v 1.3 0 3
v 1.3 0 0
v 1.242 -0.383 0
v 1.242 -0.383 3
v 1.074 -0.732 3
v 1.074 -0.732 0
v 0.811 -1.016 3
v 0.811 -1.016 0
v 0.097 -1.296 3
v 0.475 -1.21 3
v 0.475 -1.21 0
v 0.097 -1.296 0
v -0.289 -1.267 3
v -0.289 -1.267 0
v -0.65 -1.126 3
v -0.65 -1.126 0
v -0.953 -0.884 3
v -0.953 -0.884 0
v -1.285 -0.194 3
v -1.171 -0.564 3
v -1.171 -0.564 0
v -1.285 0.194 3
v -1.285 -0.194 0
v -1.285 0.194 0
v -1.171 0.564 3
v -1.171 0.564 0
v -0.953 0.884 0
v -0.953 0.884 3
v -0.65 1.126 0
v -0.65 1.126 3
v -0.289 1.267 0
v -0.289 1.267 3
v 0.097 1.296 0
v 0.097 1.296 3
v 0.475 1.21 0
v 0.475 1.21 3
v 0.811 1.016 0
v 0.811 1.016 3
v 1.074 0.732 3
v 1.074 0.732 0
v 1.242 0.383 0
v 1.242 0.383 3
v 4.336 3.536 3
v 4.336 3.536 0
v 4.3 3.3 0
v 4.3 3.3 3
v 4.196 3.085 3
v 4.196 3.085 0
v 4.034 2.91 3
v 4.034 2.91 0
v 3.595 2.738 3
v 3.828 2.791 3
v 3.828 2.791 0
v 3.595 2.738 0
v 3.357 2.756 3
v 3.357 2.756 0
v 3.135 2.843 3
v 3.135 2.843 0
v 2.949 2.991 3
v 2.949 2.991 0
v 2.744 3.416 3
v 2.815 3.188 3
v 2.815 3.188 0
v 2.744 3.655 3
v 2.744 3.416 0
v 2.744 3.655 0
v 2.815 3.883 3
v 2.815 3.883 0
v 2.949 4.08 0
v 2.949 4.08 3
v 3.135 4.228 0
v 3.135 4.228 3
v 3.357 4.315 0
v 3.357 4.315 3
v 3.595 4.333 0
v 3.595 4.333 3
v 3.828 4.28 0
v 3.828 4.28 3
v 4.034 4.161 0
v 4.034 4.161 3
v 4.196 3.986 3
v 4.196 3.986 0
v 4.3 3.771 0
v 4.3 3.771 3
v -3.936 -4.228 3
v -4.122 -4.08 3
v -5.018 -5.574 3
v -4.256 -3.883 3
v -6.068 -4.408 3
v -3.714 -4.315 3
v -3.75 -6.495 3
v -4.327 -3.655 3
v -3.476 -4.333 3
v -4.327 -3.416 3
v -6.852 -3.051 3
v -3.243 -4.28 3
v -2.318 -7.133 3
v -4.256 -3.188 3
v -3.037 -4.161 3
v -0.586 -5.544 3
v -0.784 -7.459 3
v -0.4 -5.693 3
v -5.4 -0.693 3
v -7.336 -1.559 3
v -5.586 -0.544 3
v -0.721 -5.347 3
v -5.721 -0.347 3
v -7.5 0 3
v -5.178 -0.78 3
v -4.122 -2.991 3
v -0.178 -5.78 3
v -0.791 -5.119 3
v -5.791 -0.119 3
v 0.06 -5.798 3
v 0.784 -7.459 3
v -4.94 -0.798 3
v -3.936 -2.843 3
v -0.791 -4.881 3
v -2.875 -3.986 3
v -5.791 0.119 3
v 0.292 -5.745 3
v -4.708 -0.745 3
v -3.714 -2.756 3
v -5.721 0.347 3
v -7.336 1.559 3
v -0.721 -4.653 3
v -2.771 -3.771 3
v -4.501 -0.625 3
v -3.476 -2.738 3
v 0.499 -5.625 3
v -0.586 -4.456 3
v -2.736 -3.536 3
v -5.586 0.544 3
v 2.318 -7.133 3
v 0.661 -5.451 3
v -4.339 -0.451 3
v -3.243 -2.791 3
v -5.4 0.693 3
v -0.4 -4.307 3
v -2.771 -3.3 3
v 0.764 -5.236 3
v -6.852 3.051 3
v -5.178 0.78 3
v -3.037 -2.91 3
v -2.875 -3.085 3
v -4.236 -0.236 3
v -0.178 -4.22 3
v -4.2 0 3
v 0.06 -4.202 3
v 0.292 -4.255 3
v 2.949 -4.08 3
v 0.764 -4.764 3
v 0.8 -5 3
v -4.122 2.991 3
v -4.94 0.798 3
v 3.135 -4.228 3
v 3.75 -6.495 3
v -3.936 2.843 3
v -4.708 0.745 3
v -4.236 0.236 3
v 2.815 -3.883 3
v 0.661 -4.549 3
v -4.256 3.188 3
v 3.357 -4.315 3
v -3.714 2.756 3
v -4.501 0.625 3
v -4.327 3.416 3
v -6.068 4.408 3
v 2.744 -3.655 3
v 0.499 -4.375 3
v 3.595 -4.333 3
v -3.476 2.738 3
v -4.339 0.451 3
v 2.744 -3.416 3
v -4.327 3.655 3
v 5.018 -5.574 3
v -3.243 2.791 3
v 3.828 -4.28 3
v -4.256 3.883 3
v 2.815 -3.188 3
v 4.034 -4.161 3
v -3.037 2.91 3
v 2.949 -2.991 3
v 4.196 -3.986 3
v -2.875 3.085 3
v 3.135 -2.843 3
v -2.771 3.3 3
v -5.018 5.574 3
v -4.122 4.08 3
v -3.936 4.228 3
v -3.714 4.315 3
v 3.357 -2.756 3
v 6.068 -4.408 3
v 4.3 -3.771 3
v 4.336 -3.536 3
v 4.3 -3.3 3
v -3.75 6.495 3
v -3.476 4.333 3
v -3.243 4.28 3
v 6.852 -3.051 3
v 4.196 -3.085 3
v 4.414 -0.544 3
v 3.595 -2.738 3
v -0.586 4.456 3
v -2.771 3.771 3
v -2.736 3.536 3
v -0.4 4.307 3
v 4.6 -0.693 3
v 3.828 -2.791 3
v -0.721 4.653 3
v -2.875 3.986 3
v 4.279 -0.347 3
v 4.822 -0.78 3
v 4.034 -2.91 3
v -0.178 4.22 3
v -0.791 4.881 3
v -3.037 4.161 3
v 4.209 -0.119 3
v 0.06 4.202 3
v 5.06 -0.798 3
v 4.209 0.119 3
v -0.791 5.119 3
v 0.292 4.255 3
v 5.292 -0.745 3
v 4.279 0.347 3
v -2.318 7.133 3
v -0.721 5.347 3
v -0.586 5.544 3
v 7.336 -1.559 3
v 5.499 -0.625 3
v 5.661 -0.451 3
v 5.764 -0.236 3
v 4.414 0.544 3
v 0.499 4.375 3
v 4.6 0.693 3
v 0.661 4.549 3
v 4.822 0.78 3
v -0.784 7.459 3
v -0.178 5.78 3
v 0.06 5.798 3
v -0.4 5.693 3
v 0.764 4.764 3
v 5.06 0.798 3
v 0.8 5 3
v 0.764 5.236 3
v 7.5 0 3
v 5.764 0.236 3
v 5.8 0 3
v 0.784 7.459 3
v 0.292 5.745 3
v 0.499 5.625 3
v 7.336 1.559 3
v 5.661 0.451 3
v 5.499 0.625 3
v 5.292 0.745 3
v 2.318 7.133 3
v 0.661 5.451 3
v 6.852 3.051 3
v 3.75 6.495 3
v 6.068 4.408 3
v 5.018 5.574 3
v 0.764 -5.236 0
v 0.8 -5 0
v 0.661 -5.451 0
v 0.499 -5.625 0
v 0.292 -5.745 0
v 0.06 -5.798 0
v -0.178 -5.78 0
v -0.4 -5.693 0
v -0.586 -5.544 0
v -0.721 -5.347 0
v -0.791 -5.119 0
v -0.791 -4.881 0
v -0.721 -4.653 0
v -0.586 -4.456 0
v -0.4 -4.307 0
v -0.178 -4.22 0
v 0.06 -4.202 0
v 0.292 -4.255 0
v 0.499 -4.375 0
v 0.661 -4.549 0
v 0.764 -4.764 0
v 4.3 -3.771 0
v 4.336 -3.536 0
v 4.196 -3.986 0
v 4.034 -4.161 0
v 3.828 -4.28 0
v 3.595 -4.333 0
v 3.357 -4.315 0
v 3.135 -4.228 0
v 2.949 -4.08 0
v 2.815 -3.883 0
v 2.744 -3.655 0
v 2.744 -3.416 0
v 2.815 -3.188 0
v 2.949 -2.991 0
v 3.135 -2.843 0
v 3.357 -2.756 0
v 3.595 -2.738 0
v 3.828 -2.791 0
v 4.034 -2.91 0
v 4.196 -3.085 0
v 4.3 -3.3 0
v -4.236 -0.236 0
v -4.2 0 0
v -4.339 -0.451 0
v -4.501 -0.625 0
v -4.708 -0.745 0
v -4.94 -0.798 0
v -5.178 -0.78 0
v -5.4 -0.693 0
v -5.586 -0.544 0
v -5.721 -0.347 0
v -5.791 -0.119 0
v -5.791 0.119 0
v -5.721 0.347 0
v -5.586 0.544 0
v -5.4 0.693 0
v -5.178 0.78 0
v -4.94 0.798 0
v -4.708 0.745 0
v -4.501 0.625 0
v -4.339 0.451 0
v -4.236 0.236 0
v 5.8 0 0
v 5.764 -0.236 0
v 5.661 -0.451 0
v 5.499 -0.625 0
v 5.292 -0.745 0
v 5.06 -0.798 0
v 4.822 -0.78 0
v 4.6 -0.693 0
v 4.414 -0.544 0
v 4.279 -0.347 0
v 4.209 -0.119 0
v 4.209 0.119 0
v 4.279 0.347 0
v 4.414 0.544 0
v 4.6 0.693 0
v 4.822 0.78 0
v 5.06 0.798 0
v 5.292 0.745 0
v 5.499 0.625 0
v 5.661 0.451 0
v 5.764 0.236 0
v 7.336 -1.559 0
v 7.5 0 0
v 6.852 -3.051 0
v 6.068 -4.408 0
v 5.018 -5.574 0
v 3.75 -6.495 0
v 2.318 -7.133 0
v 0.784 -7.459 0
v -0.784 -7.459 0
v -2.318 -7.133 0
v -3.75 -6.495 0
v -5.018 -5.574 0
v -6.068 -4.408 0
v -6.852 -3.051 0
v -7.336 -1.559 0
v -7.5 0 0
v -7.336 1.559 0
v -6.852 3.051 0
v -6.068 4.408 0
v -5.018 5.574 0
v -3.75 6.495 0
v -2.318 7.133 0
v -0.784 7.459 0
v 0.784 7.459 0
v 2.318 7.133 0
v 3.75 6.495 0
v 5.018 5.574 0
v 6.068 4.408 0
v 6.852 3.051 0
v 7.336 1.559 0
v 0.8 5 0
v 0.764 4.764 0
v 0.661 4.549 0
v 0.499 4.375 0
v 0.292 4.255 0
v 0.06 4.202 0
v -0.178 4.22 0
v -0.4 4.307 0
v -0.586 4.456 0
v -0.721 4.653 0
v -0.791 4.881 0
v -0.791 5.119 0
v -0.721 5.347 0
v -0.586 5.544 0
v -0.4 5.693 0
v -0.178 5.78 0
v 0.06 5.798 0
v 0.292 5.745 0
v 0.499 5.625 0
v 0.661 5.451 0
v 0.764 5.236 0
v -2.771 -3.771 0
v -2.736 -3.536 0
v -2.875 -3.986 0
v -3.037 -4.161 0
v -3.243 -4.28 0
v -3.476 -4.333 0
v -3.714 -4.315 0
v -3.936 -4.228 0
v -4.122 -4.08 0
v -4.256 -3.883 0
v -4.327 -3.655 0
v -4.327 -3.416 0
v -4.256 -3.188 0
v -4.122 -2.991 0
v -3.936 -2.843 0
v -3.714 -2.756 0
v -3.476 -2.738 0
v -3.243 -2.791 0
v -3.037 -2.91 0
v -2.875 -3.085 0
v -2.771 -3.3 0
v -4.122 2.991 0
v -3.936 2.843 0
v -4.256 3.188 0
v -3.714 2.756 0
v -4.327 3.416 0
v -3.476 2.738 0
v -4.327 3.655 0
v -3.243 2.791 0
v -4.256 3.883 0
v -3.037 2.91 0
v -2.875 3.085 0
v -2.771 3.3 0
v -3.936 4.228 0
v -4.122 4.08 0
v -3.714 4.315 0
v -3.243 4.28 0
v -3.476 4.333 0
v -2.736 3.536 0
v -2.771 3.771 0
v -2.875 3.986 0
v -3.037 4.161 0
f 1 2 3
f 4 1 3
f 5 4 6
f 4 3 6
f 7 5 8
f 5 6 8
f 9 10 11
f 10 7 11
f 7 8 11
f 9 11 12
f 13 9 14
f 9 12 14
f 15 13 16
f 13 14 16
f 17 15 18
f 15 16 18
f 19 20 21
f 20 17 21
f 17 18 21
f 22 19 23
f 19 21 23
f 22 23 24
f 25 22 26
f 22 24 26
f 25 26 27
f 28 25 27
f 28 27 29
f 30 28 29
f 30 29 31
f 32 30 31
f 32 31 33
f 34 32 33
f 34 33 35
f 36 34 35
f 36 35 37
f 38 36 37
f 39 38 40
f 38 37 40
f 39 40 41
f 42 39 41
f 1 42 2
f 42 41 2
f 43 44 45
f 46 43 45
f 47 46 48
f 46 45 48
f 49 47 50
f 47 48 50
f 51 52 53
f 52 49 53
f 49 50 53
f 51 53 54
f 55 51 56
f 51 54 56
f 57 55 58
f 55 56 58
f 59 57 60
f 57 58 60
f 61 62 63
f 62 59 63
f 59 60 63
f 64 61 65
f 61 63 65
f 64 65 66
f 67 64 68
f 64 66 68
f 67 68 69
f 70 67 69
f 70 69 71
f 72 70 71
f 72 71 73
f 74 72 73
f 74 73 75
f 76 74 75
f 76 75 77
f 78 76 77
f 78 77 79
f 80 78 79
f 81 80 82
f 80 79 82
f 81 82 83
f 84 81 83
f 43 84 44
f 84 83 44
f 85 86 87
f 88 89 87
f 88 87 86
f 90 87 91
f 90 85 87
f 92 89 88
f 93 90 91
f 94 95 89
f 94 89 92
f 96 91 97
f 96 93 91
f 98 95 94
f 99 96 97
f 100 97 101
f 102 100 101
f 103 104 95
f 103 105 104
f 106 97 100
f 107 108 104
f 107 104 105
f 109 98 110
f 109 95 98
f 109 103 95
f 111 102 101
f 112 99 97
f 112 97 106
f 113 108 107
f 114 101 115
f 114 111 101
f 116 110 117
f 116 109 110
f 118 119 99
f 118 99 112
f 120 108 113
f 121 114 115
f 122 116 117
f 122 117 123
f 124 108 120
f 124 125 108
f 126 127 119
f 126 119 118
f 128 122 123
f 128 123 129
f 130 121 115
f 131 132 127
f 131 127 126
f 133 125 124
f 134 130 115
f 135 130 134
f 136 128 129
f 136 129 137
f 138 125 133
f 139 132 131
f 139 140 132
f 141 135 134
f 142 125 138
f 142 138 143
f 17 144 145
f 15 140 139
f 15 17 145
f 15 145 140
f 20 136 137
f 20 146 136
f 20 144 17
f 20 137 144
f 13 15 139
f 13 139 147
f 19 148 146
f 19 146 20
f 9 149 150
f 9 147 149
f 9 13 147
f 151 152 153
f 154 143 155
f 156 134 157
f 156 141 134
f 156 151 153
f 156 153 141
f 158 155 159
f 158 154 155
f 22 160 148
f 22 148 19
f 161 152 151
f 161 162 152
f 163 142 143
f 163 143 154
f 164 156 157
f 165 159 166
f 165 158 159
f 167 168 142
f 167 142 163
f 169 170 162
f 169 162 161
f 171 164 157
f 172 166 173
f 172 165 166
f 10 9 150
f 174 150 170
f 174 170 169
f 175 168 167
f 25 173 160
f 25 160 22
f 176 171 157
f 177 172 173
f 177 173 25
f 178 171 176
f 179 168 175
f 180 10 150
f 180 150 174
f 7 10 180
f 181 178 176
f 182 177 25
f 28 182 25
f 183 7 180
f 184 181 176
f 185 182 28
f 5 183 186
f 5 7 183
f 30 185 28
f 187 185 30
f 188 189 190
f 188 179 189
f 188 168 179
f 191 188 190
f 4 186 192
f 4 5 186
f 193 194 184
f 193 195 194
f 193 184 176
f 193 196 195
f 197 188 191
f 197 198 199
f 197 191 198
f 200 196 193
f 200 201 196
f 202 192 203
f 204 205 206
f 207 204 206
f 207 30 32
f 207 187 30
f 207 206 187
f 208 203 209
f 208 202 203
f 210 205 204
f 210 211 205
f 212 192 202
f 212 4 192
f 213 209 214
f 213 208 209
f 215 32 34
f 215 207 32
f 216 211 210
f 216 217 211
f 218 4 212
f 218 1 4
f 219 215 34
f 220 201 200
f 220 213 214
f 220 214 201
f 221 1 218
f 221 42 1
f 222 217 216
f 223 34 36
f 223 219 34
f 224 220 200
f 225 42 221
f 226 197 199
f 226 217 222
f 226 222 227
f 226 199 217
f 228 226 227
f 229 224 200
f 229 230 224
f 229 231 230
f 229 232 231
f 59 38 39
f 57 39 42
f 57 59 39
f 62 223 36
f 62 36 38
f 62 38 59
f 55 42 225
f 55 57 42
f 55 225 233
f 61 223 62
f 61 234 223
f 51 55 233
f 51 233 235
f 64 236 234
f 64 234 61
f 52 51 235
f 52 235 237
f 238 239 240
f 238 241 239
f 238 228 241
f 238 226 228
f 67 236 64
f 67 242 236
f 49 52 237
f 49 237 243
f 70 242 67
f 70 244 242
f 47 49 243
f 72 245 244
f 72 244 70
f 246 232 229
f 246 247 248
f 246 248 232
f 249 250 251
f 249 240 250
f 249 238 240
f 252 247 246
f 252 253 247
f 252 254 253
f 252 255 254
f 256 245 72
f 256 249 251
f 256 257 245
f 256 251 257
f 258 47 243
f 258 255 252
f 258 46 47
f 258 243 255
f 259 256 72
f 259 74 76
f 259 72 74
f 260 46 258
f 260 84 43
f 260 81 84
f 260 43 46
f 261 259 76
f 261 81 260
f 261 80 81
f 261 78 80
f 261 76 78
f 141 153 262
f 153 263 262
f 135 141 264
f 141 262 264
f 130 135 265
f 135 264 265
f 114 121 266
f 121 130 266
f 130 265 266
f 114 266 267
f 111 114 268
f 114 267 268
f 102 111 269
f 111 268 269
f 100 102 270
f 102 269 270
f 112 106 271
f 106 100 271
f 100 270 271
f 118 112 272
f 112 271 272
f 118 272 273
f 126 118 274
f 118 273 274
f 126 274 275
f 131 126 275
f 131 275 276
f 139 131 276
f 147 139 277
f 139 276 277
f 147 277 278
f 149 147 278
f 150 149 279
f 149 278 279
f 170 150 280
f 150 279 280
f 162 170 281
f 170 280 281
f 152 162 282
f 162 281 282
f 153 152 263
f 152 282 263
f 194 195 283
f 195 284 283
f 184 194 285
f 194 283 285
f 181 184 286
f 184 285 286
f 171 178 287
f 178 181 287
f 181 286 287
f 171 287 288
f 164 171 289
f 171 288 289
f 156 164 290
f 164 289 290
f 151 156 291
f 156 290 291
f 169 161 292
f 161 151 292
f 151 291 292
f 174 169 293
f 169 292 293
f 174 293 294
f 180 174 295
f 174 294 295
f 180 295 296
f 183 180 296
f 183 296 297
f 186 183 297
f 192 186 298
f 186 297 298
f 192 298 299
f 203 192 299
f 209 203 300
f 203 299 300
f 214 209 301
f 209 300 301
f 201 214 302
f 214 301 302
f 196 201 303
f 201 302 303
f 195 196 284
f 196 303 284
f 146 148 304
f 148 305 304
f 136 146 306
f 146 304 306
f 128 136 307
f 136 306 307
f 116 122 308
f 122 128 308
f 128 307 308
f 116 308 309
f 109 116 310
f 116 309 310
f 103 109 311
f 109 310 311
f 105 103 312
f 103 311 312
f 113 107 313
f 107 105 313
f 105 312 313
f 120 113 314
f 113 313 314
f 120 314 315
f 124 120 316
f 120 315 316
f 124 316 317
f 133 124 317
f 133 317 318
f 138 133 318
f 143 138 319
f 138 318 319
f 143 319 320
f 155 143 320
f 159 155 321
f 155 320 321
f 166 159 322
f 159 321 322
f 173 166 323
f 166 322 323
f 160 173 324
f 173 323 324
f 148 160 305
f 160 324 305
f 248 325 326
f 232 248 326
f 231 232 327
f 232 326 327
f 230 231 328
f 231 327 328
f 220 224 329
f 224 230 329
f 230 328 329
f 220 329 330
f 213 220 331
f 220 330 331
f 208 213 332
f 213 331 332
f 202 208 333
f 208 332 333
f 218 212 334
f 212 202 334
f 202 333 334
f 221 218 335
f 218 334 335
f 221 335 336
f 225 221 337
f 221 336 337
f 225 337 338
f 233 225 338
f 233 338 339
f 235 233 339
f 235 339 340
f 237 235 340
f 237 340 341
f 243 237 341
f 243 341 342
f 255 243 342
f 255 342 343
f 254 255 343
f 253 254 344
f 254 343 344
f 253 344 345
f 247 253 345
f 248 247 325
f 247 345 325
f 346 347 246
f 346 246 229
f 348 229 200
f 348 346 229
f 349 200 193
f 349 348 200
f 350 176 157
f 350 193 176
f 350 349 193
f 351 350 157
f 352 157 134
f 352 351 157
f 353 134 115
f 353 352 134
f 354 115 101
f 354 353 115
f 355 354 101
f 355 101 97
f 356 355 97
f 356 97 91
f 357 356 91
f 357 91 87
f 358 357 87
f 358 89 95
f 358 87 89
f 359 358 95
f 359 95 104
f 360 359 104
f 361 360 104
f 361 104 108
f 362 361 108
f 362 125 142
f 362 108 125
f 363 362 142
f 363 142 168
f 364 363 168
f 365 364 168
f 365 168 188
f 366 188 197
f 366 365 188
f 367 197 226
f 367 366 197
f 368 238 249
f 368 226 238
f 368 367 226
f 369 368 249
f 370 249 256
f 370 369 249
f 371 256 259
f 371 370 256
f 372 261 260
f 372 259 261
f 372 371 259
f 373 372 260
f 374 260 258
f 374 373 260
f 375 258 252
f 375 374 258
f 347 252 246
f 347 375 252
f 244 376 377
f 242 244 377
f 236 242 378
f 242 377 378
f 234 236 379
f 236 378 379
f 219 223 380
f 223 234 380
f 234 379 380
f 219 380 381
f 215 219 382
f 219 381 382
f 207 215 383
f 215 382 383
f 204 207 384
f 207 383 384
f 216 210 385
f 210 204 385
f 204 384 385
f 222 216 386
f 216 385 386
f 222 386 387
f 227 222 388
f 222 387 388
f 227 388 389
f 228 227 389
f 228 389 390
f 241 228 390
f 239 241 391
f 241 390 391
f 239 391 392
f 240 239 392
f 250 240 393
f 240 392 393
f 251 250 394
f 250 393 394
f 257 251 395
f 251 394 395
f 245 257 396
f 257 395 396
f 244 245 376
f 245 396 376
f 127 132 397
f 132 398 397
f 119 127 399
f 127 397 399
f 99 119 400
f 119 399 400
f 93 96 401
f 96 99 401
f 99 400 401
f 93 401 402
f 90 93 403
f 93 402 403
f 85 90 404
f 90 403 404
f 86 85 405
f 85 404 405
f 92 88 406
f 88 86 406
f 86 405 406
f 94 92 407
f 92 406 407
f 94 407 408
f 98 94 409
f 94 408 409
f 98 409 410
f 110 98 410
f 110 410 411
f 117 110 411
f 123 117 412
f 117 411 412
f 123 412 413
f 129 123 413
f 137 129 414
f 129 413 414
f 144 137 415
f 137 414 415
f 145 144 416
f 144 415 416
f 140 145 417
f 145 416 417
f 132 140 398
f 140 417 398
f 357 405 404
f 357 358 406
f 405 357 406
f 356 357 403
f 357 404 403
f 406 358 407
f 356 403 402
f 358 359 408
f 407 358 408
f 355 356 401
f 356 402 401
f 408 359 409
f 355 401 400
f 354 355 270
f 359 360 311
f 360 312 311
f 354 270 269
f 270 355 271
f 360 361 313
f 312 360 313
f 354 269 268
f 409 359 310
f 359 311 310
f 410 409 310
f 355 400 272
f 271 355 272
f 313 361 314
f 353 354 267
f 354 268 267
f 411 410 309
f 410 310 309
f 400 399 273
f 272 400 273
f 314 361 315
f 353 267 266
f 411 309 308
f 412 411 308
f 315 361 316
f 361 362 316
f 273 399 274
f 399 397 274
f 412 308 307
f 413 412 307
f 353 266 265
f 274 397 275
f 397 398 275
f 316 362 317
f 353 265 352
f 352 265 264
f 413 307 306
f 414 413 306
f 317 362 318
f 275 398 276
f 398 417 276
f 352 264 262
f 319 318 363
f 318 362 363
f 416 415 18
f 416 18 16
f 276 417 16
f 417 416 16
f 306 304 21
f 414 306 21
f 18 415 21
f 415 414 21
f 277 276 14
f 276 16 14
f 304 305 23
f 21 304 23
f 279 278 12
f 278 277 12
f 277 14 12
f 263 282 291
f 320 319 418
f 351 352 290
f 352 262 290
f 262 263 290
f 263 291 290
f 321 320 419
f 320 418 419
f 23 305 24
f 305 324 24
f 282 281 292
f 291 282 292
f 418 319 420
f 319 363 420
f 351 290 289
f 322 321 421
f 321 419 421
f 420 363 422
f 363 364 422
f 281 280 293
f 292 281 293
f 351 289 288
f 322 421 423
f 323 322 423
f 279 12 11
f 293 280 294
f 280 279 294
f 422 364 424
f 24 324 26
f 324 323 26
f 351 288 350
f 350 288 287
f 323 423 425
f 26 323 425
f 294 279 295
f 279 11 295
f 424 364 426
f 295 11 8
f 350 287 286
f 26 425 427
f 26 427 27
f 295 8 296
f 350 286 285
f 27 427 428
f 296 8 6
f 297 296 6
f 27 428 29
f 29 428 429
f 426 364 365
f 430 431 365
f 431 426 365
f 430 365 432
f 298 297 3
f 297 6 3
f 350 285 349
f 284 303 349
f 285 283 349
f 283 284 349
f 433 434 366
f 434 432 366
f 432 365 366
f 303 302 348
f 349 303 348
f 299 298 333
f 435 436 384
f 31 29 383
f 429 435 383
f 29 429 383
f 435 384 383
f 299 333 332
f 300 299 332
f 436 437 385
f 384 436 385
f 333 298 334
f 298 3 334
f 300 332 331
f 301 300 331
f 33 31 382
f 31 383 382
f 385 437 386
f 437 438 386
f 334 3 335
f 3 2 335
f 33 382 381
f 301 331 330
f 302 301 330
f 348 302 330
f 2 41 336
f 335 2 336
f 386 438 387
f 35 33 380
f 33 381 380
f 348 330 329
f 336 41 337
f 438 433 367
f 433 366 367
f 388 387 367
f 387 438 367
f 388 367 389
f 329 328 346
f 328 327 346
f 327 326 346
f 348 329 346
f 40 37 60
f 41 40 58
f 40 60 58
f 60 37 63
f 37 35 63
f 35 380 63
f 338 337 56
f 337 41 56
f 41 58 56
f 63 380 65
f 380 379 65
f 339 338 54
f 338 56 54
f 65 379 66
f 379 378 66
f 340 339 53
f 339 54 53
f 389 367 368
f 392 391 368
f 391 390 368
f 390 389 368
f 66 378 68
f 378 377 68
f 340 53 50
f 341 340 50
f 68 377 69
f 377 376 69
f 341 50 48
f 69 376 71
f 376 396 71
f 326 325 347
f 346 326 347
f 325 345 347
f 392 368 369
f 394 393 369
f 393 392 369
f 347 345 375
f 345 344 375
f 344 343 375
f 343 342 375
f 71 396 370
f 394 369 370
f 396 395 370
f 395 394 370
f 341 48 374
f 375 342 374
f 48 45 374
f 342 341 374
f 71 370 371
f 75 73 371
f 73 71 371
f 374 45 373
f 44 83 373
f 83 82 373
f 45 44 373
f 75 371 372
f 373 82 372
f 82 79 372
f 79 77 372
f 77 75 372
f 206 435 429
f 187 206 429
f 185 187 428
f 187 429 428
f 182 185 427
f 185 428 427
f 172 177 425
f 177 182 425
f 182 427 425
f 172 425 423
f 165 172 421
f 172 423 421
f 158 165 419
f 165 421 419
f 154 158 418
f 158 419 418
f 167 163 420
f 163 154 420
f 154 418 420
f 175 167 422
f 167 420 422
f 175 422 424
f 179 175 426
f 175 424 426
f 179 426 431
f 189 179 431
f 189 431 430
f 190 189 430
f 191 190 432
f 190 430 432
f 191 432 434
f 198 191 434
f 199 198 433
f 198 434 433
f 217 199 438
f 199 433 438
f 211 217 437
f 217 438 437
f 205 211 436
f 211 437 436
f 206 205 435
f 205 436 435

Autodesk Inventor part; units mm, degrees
ref_plane "YZ Plane" through (0, 0, 0) normal (1, 0, 0) x (0, 1, 0)
ref_plane "XZ Plane" through (0, 0, 0) normal (0, 1, 0) x (-1, 0, 0)
ref_plane "XY Plane" through (0, 0, 0) normal (0, 0, 1) x (1, 0, 0)
sketch "スケッチ1" plane through (0, 0, 0) normal (0, 0, 1) x (1, 0, 0)
  circle A0 centre (0, 0) radius 7.5
  circle A1 centre (0, 0) radius 5 construction
  circle A2 centre (0, 5) radius 0.8
  circle A3 centre (-3.5355, 3.5355) radius 0.8
  circle A4 centre (-5, 0) radius 0.8
  circle A5 centre (-3.5355, -3.5355) radius 0.8
  circle A6 centre (0, -5) radius 0.8
  circle A7 centre (3.5355, -3.5355) radius 0.8
  circle A8 centre (5, 0) radius 0.8
  circle A9 centre (3.5355, 3.5355) radius 0.8
  circle A10 centre (0, 0) radius 1.3
  dimension "d1" = 10
  dimension "d0" = 15
  dimension "d2" = 1.6
  dimension "d5" = 360
  dimension "d7" = 2.6
extrude "押し出し1" add sketch "スケッチ1" along normal blind 3
properties part number "dentatu"
